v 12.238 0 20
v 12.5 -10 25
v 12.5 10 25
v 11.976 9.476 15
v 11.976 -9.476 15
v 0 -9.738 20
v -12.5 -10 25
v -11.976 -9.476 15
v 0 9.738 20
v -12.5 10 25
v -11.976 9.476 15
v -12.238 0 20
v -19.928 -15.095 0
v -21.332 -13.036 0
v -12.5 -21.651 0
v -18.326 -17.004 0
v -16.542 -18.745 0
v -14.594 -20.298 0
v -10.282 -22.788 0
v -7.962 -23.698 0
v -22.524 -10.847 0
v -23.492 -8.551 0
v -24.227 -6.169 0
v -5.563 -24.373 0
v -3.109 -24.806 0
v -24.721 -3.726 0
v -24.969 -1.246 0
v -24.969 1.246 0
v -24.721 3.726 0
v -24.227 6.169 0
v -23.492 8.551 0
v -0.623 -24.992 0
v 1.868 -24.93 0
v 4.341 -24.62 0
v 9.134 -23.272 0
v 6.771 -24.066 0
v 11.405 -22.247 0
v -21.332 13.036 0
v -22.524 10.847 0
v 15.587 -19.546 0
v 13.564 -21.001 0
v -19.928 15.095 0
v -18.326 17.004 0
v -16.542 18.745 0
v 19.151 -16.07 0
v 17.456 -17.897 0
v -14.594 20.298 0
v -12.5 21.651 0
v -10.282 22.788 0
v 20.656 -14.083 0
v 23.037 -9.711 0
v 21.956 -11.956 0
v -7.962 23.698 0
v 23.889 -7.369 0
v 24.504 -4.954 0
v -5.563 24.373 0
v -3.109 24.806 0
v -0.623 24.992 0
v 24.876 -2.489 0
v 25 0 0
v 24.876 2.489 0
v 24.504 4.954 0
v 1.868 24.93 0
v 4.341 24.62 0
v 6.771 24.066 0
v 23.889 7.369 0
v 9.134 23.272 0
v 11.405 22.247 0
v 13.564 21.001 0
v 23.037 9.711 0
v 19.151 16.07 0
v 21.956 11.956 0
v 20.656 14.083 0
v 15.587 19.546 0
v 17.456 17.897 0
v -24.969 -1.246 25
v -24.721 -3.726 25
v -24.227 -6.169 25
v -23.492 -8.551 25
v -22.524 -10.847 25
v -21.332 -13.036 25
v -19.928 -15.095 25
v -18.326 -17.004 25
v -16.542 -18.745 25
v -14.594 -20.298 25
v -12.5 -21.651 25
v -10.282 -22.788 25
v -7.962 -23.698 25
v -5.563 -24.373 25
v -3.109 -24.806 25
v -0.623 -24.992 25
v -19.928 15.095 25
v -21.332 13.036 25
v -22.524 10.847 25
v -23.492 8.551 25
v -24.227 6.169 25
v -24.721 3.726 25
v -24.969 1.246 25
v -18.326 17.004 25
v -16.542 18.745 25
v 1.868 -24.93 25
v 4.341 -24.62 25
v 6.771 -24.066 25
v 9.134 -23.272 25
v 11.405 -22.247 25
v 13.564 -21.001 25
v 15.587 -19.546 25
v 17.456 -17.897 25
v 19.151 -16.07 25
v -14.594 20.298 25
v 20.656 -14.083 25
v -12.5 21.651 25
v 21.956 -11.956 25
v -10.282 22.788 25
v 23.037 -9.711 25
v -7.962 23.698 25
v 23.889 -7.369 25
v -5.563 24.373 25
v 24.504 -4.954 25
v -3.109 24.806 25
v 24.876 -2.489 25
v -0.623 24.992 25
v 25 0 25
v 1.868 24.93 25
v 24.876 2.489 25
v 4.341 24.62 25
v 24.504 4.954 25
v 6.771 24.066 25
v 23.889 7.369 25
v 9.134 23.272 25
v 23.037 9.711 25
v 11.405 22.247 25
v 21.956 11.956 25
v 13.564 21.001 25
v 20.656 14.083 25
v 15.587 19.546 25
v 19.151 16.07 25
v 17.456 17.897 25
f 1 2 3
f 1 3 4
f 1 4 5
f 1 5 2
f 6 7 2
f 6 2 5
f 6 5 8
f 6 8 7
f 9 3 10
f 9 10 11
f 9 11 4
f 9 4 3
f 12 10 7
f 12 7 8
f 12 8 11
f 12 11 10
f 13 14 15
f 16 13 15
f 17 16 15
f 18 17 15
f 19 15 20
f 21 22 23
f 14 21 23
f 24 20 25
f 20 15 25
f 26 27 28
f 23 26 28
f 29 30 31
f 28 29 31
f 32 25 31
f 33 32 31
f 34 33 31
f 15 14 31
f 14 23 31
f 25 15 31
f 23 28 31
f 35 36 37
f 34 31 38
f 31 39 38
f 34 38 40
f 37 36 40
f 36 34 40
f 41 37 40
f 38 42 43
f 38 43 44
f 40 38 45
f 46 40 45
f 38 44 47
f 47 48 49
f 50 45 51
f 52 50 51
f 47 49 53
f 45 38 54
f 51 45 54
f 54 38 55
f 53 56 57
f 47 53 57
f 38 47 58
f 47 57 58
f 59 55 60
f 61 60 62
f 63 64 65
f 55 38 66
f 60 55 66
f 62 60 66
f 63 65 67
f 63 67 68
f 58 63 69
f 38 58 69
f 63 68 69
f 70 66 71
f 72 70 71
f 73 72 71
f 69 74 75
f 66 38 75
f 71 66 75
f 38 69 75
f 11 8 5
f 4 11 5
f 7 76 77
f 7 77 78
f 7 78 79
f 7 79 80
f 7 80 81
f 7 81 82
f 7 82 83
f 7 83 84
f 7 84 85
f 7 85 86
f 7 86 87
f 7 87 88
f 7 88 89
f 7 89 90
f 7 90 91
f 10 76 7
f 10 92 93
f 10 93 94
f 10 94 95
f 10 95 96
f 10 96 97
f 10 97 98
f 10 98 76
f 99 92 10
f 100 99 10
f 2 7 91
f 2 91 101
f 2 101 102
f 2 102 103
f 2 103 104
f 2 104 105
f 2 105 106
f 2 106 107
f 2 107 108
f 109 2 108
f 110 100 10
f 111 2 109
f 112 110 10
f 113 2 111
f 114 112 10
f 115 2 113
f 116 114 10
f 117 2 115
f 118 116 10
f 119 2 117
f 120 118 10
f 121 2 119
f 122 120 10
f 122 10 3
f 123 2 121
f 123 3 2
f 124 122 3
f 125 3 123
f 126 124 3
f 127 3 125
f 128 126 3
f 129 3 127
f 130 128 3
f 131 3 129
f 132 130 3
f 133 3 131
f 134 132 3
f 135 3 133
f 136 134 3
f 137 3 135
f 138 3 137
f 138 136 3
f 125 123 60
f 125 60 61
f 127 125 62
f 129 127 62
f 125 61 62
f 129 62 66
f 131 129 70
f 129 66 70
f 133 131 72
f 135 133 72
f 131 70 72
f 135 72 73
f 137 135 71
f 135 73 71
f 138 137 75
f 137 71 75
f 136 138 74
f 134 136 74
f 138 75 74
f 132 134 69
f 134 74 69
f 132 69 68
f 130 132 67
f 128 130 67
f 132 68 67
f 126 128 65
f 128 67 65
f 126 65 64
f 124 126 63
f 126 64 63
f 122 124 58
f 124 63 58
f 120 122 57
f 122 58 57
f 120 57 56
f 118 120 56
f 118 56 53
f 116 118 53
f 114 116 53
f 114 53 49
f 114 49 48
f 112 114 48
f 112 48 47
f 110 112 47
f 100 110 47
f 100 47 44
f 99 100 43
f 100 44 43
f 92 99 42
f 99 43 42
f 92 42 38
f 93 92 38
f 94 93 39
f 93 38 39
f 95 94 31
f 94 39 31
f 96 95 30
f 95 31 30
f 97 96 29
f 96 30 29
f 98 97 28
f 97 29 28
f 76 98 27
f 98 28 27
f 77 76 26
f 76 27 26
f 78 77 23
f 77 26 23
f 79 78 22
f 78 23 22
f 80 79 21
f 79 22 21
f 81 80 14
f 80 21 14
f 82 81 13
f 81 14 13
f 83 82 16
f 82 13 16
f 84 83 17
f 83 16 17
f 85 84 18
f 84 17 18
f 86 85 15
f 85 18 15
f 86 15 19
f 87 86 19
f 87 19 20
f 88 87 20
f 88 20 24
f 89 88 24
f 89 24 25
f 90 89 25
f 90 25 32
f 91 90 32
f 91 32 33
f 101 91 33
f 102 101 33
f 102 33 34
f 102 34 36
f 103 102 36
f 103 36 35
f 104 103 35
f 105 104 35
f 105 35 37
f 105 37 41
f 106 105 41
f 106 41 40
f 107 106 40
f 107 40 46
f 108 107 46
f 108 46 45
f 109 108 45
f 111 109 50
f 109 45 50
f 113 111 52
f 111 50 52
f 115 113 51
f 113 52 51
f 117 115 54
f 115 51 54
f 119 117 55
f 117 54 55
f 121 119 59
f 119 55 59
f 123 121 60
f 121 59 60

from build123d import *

# Parameters (mm, degrees)
F0_R     = 25
F1_DEPTH = 25
F2_W     = 25
F2_H     = 20
F3_DEPTH = 10
F3_TAPER = 3


with BuildPart() as f1:
    # F0 (on Top) → F1 (new body)
    with BuildSketch(Plane.XY):
        Circle(F0_R)
    extrude(amount=F1_DEPTH)

    # F2 (on face) → F3 (cut)
    with BuildSketch(Plane.XY.offset(25)):
        Rectangle(F2_W, F2_H)
    extrude(amount=-F3_DEPTH, taper=F3_TAPER, mode=Mode.SUBTRACT)


solid = f1.part
